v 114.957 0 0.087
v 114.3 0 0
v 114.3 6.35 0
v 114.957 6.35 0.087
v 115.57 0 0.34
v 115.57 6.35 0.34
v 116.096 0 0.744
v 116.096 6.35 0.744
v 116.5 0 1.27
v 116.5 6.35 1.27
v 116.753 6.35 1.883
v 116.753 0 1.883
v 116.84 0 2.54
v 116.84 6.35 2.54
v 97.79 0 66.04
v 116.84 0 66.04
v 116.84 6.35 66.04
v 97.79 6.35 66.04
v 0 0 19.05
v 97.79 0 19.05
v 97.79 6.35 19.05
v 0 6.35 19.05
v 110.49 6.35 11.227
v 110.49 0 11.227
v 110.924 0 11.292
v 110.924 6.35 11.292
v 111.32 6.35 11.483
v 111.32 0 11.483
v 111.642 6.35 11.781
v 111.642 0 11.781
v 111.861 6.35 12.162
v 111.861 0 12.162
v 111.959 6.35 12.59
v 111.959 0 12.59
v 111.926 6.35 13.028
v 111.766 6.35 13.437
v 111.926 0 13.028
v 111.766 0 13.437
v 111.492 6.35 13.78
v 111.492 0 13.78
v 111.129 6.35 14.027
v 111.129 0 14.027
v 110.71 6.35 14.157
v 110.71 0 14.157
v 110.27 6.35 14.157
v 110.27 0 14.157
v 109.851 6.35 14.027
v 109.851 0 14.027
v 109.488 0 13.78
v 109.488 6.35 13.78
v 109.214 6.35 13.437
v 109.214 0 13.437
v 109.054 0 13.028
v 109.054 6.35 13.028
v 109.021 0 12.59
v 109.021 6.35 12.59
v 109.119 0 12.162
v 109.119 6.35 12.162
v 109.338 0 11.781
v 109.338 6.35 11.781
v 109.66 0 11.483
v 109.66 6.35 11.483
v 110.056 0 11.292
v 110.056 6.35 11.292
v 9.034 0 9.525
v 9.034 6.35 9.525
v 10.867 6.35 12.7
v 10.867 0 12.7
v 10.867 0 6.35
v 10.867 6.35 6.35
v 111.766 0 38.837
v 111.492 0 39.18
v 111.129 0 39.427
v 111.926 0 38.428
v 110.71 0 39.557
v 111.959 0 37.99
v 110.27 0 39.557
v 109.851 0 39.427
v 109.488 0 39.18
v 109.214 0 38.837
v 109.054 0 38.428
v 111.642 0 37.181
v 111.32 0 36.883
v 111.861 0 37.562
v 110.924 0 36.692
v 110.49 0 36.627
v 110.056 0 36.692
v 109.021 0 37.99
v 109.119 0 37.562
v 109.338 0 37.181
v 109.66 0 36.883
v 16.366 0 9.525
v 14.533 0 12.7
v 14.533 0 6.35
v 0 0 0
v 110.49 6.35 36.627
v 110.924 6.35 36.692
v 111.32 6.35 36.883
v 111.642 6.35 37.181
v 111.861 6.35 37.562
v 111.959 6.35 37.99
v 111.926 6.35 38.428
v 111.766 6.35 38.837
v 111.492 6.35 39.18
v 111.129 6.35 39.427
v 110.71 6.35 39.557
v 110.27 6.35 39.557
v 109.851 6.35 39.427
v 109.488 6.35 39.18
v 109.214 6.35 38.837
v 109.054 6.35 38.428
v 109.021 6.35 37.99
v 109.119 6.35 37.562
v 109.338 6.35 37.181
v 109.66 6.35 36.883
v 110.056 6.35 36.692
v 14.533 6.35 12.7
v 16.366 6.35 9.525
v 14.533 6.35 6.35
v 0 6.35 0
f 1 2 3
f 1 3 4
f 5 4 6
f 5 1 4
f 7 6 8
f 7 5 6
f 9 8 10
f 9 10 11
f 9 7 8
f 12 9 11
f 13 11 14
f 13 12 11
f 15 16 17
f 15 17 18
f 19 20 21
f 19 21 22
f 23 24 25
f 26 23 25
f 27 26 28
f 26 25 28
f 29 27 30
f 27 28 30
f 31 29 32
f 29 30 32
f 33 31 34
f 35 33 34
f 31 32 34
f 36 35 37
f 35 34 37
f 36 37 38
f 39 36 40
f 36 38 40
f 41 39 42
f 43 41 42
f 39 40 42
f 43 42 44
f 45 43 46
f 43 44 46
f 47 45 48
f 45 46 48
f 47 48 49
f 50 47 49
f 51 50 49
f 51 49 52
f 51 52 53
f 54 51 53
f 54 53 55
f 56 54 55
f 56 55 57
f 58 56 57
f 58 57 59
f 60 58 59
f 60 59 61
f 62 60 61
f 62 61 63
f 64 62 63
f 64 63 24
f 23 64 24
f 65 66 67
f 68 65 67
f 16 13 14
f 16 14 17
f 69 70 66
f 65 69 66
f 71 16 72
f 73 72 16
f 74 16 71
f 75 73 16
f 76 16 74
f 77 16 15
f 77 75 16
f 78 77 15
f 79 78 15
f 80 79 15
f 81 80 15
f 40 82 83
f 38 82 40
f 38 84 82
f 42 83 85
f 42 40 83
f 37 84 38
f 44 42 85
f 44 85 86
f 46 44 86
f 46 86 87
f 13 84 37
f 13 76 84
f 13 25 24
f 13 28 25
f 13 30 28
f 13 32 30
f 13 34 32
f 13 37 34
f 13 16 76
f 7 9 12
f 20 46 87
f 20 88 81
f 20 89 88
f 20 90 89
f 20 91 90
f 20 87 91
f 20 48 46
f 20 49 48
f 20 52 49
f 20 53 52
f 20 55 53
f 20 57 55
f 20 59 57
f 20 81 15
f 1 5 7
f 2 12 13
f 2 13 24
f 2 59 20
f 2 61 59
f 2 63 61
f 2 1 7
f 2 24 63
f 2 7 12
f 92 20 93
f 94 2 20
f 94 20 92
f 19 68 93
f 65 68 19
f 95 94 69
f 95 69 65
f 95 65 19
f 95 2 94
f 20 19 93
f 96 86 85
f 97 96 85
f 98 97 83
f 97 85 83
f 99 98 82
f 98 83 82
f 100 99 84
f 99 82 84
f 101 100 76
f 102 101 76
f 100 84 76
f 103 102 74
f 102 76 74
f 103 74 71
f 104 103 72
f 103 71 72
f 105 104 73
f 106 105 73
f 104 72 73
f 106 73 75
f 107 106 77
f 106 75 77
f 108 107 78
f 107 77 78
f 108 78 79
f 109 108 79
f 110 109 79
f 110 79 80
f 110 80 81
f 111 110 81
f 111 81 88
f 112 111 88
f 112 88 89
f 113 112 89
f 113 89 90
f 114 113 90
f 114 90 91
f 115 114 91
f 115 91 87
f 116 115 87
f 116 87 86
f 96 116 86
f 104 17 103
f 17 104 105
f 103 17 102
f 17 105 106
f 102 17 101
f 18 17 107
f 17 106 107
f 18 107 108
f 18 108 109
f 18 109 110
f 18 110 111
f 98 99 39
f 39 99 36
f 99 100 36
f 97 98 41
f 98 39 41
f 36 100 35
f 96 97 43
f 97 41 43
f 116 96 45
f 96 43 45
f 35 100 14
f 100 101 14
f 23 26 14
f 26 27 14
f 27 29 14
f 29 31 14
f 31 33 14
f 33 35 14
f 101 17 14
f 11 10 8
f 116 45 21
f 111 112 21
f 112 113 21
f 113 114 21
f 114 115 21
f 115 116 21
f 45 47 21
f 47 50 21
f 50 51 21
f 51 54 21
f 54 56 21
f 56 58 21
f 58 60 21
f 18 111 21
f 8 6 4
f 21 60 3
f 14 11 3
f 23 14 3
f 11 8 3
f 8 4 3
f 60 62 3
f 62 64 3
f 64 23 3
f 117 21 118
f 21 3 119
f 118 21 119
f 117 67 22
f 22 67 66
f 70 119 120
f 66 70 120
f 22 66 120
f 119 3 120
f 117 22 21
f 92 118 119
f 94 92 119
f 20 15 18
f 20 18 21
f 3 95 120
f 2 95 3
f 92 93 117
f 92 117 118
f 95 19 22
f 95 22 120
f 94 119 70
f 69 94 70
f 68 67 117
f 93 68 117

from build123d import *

# Parameters (mm, degrees)
BOSS_EXTRUDE1_DEPTH = 6.35
CUT_EXTRUDE1_DEPTH  = 135.362158735
SKETCH3_R           = 1.4732
CUT_EXTRUDE2_DEPTH  = 135.362158735


with BuildPart() as part:
    # Sketch1 → Boss-Extrude1 (new body)
    with BuildSketch(Plane(origin=(0, 0, 0), x_dir=(1, 0, 0), z_dir=(0, 1, 0))):
        with BuildLine():
            Line((0, 0), (114.3, 0))
            ThreePointArc((114.3, 0), (116.096051224, -0.743948776), (116.84, -2.54))
            Line((116.84, -2.54), (116.84, -66.04))
            Line((116.84, -66.04), (97.79, -66.04))
            Line((97.79, -66.04), (97.79, -19.05))
            Line((97.79, -19.05), (0, -19.05))
            Line((0, -19.05), (0, 0))
        make_face()
    extrude(amount=BOSS_EXTRUDE1_DEPTH)

    # Sketch2 → Cut-Extrude1 (cut, through all)
    with BuildSketch(Plane(origin=(0, 6.35, 0), x_dir=(1, 0, 0), z_dir=(0, 1, 0))):
        Polygon((14.533087105, -12.7), (16.366174209, -9.525), (14.533087105, -6.35), (10.866912895, -6.35), (9.033825791, -9.525), (10.866912895, -12.7), align=None)
    extrude(amount=-CUT_EXTRUDE1_DEPTH, mode=Mode.SUBTRACT)

    # Sketch3 → Cut-Extrude2 (cut, through all)
    with BuildSketch(Plane.XZ):
        with Locations(Location((110.49, 38.1, 0), (0, 0, 270))):
            Circle(SKETCH3_R)
        with Locations(Location((110.49, 12.7, 0), (0, 0, 270))):
            Circle(SKETCH3_R)
    extrude(amount=-CUT_EXTRUDE2_DEPTH, mode=Mode.SUBTRACT)


solid = part.part
